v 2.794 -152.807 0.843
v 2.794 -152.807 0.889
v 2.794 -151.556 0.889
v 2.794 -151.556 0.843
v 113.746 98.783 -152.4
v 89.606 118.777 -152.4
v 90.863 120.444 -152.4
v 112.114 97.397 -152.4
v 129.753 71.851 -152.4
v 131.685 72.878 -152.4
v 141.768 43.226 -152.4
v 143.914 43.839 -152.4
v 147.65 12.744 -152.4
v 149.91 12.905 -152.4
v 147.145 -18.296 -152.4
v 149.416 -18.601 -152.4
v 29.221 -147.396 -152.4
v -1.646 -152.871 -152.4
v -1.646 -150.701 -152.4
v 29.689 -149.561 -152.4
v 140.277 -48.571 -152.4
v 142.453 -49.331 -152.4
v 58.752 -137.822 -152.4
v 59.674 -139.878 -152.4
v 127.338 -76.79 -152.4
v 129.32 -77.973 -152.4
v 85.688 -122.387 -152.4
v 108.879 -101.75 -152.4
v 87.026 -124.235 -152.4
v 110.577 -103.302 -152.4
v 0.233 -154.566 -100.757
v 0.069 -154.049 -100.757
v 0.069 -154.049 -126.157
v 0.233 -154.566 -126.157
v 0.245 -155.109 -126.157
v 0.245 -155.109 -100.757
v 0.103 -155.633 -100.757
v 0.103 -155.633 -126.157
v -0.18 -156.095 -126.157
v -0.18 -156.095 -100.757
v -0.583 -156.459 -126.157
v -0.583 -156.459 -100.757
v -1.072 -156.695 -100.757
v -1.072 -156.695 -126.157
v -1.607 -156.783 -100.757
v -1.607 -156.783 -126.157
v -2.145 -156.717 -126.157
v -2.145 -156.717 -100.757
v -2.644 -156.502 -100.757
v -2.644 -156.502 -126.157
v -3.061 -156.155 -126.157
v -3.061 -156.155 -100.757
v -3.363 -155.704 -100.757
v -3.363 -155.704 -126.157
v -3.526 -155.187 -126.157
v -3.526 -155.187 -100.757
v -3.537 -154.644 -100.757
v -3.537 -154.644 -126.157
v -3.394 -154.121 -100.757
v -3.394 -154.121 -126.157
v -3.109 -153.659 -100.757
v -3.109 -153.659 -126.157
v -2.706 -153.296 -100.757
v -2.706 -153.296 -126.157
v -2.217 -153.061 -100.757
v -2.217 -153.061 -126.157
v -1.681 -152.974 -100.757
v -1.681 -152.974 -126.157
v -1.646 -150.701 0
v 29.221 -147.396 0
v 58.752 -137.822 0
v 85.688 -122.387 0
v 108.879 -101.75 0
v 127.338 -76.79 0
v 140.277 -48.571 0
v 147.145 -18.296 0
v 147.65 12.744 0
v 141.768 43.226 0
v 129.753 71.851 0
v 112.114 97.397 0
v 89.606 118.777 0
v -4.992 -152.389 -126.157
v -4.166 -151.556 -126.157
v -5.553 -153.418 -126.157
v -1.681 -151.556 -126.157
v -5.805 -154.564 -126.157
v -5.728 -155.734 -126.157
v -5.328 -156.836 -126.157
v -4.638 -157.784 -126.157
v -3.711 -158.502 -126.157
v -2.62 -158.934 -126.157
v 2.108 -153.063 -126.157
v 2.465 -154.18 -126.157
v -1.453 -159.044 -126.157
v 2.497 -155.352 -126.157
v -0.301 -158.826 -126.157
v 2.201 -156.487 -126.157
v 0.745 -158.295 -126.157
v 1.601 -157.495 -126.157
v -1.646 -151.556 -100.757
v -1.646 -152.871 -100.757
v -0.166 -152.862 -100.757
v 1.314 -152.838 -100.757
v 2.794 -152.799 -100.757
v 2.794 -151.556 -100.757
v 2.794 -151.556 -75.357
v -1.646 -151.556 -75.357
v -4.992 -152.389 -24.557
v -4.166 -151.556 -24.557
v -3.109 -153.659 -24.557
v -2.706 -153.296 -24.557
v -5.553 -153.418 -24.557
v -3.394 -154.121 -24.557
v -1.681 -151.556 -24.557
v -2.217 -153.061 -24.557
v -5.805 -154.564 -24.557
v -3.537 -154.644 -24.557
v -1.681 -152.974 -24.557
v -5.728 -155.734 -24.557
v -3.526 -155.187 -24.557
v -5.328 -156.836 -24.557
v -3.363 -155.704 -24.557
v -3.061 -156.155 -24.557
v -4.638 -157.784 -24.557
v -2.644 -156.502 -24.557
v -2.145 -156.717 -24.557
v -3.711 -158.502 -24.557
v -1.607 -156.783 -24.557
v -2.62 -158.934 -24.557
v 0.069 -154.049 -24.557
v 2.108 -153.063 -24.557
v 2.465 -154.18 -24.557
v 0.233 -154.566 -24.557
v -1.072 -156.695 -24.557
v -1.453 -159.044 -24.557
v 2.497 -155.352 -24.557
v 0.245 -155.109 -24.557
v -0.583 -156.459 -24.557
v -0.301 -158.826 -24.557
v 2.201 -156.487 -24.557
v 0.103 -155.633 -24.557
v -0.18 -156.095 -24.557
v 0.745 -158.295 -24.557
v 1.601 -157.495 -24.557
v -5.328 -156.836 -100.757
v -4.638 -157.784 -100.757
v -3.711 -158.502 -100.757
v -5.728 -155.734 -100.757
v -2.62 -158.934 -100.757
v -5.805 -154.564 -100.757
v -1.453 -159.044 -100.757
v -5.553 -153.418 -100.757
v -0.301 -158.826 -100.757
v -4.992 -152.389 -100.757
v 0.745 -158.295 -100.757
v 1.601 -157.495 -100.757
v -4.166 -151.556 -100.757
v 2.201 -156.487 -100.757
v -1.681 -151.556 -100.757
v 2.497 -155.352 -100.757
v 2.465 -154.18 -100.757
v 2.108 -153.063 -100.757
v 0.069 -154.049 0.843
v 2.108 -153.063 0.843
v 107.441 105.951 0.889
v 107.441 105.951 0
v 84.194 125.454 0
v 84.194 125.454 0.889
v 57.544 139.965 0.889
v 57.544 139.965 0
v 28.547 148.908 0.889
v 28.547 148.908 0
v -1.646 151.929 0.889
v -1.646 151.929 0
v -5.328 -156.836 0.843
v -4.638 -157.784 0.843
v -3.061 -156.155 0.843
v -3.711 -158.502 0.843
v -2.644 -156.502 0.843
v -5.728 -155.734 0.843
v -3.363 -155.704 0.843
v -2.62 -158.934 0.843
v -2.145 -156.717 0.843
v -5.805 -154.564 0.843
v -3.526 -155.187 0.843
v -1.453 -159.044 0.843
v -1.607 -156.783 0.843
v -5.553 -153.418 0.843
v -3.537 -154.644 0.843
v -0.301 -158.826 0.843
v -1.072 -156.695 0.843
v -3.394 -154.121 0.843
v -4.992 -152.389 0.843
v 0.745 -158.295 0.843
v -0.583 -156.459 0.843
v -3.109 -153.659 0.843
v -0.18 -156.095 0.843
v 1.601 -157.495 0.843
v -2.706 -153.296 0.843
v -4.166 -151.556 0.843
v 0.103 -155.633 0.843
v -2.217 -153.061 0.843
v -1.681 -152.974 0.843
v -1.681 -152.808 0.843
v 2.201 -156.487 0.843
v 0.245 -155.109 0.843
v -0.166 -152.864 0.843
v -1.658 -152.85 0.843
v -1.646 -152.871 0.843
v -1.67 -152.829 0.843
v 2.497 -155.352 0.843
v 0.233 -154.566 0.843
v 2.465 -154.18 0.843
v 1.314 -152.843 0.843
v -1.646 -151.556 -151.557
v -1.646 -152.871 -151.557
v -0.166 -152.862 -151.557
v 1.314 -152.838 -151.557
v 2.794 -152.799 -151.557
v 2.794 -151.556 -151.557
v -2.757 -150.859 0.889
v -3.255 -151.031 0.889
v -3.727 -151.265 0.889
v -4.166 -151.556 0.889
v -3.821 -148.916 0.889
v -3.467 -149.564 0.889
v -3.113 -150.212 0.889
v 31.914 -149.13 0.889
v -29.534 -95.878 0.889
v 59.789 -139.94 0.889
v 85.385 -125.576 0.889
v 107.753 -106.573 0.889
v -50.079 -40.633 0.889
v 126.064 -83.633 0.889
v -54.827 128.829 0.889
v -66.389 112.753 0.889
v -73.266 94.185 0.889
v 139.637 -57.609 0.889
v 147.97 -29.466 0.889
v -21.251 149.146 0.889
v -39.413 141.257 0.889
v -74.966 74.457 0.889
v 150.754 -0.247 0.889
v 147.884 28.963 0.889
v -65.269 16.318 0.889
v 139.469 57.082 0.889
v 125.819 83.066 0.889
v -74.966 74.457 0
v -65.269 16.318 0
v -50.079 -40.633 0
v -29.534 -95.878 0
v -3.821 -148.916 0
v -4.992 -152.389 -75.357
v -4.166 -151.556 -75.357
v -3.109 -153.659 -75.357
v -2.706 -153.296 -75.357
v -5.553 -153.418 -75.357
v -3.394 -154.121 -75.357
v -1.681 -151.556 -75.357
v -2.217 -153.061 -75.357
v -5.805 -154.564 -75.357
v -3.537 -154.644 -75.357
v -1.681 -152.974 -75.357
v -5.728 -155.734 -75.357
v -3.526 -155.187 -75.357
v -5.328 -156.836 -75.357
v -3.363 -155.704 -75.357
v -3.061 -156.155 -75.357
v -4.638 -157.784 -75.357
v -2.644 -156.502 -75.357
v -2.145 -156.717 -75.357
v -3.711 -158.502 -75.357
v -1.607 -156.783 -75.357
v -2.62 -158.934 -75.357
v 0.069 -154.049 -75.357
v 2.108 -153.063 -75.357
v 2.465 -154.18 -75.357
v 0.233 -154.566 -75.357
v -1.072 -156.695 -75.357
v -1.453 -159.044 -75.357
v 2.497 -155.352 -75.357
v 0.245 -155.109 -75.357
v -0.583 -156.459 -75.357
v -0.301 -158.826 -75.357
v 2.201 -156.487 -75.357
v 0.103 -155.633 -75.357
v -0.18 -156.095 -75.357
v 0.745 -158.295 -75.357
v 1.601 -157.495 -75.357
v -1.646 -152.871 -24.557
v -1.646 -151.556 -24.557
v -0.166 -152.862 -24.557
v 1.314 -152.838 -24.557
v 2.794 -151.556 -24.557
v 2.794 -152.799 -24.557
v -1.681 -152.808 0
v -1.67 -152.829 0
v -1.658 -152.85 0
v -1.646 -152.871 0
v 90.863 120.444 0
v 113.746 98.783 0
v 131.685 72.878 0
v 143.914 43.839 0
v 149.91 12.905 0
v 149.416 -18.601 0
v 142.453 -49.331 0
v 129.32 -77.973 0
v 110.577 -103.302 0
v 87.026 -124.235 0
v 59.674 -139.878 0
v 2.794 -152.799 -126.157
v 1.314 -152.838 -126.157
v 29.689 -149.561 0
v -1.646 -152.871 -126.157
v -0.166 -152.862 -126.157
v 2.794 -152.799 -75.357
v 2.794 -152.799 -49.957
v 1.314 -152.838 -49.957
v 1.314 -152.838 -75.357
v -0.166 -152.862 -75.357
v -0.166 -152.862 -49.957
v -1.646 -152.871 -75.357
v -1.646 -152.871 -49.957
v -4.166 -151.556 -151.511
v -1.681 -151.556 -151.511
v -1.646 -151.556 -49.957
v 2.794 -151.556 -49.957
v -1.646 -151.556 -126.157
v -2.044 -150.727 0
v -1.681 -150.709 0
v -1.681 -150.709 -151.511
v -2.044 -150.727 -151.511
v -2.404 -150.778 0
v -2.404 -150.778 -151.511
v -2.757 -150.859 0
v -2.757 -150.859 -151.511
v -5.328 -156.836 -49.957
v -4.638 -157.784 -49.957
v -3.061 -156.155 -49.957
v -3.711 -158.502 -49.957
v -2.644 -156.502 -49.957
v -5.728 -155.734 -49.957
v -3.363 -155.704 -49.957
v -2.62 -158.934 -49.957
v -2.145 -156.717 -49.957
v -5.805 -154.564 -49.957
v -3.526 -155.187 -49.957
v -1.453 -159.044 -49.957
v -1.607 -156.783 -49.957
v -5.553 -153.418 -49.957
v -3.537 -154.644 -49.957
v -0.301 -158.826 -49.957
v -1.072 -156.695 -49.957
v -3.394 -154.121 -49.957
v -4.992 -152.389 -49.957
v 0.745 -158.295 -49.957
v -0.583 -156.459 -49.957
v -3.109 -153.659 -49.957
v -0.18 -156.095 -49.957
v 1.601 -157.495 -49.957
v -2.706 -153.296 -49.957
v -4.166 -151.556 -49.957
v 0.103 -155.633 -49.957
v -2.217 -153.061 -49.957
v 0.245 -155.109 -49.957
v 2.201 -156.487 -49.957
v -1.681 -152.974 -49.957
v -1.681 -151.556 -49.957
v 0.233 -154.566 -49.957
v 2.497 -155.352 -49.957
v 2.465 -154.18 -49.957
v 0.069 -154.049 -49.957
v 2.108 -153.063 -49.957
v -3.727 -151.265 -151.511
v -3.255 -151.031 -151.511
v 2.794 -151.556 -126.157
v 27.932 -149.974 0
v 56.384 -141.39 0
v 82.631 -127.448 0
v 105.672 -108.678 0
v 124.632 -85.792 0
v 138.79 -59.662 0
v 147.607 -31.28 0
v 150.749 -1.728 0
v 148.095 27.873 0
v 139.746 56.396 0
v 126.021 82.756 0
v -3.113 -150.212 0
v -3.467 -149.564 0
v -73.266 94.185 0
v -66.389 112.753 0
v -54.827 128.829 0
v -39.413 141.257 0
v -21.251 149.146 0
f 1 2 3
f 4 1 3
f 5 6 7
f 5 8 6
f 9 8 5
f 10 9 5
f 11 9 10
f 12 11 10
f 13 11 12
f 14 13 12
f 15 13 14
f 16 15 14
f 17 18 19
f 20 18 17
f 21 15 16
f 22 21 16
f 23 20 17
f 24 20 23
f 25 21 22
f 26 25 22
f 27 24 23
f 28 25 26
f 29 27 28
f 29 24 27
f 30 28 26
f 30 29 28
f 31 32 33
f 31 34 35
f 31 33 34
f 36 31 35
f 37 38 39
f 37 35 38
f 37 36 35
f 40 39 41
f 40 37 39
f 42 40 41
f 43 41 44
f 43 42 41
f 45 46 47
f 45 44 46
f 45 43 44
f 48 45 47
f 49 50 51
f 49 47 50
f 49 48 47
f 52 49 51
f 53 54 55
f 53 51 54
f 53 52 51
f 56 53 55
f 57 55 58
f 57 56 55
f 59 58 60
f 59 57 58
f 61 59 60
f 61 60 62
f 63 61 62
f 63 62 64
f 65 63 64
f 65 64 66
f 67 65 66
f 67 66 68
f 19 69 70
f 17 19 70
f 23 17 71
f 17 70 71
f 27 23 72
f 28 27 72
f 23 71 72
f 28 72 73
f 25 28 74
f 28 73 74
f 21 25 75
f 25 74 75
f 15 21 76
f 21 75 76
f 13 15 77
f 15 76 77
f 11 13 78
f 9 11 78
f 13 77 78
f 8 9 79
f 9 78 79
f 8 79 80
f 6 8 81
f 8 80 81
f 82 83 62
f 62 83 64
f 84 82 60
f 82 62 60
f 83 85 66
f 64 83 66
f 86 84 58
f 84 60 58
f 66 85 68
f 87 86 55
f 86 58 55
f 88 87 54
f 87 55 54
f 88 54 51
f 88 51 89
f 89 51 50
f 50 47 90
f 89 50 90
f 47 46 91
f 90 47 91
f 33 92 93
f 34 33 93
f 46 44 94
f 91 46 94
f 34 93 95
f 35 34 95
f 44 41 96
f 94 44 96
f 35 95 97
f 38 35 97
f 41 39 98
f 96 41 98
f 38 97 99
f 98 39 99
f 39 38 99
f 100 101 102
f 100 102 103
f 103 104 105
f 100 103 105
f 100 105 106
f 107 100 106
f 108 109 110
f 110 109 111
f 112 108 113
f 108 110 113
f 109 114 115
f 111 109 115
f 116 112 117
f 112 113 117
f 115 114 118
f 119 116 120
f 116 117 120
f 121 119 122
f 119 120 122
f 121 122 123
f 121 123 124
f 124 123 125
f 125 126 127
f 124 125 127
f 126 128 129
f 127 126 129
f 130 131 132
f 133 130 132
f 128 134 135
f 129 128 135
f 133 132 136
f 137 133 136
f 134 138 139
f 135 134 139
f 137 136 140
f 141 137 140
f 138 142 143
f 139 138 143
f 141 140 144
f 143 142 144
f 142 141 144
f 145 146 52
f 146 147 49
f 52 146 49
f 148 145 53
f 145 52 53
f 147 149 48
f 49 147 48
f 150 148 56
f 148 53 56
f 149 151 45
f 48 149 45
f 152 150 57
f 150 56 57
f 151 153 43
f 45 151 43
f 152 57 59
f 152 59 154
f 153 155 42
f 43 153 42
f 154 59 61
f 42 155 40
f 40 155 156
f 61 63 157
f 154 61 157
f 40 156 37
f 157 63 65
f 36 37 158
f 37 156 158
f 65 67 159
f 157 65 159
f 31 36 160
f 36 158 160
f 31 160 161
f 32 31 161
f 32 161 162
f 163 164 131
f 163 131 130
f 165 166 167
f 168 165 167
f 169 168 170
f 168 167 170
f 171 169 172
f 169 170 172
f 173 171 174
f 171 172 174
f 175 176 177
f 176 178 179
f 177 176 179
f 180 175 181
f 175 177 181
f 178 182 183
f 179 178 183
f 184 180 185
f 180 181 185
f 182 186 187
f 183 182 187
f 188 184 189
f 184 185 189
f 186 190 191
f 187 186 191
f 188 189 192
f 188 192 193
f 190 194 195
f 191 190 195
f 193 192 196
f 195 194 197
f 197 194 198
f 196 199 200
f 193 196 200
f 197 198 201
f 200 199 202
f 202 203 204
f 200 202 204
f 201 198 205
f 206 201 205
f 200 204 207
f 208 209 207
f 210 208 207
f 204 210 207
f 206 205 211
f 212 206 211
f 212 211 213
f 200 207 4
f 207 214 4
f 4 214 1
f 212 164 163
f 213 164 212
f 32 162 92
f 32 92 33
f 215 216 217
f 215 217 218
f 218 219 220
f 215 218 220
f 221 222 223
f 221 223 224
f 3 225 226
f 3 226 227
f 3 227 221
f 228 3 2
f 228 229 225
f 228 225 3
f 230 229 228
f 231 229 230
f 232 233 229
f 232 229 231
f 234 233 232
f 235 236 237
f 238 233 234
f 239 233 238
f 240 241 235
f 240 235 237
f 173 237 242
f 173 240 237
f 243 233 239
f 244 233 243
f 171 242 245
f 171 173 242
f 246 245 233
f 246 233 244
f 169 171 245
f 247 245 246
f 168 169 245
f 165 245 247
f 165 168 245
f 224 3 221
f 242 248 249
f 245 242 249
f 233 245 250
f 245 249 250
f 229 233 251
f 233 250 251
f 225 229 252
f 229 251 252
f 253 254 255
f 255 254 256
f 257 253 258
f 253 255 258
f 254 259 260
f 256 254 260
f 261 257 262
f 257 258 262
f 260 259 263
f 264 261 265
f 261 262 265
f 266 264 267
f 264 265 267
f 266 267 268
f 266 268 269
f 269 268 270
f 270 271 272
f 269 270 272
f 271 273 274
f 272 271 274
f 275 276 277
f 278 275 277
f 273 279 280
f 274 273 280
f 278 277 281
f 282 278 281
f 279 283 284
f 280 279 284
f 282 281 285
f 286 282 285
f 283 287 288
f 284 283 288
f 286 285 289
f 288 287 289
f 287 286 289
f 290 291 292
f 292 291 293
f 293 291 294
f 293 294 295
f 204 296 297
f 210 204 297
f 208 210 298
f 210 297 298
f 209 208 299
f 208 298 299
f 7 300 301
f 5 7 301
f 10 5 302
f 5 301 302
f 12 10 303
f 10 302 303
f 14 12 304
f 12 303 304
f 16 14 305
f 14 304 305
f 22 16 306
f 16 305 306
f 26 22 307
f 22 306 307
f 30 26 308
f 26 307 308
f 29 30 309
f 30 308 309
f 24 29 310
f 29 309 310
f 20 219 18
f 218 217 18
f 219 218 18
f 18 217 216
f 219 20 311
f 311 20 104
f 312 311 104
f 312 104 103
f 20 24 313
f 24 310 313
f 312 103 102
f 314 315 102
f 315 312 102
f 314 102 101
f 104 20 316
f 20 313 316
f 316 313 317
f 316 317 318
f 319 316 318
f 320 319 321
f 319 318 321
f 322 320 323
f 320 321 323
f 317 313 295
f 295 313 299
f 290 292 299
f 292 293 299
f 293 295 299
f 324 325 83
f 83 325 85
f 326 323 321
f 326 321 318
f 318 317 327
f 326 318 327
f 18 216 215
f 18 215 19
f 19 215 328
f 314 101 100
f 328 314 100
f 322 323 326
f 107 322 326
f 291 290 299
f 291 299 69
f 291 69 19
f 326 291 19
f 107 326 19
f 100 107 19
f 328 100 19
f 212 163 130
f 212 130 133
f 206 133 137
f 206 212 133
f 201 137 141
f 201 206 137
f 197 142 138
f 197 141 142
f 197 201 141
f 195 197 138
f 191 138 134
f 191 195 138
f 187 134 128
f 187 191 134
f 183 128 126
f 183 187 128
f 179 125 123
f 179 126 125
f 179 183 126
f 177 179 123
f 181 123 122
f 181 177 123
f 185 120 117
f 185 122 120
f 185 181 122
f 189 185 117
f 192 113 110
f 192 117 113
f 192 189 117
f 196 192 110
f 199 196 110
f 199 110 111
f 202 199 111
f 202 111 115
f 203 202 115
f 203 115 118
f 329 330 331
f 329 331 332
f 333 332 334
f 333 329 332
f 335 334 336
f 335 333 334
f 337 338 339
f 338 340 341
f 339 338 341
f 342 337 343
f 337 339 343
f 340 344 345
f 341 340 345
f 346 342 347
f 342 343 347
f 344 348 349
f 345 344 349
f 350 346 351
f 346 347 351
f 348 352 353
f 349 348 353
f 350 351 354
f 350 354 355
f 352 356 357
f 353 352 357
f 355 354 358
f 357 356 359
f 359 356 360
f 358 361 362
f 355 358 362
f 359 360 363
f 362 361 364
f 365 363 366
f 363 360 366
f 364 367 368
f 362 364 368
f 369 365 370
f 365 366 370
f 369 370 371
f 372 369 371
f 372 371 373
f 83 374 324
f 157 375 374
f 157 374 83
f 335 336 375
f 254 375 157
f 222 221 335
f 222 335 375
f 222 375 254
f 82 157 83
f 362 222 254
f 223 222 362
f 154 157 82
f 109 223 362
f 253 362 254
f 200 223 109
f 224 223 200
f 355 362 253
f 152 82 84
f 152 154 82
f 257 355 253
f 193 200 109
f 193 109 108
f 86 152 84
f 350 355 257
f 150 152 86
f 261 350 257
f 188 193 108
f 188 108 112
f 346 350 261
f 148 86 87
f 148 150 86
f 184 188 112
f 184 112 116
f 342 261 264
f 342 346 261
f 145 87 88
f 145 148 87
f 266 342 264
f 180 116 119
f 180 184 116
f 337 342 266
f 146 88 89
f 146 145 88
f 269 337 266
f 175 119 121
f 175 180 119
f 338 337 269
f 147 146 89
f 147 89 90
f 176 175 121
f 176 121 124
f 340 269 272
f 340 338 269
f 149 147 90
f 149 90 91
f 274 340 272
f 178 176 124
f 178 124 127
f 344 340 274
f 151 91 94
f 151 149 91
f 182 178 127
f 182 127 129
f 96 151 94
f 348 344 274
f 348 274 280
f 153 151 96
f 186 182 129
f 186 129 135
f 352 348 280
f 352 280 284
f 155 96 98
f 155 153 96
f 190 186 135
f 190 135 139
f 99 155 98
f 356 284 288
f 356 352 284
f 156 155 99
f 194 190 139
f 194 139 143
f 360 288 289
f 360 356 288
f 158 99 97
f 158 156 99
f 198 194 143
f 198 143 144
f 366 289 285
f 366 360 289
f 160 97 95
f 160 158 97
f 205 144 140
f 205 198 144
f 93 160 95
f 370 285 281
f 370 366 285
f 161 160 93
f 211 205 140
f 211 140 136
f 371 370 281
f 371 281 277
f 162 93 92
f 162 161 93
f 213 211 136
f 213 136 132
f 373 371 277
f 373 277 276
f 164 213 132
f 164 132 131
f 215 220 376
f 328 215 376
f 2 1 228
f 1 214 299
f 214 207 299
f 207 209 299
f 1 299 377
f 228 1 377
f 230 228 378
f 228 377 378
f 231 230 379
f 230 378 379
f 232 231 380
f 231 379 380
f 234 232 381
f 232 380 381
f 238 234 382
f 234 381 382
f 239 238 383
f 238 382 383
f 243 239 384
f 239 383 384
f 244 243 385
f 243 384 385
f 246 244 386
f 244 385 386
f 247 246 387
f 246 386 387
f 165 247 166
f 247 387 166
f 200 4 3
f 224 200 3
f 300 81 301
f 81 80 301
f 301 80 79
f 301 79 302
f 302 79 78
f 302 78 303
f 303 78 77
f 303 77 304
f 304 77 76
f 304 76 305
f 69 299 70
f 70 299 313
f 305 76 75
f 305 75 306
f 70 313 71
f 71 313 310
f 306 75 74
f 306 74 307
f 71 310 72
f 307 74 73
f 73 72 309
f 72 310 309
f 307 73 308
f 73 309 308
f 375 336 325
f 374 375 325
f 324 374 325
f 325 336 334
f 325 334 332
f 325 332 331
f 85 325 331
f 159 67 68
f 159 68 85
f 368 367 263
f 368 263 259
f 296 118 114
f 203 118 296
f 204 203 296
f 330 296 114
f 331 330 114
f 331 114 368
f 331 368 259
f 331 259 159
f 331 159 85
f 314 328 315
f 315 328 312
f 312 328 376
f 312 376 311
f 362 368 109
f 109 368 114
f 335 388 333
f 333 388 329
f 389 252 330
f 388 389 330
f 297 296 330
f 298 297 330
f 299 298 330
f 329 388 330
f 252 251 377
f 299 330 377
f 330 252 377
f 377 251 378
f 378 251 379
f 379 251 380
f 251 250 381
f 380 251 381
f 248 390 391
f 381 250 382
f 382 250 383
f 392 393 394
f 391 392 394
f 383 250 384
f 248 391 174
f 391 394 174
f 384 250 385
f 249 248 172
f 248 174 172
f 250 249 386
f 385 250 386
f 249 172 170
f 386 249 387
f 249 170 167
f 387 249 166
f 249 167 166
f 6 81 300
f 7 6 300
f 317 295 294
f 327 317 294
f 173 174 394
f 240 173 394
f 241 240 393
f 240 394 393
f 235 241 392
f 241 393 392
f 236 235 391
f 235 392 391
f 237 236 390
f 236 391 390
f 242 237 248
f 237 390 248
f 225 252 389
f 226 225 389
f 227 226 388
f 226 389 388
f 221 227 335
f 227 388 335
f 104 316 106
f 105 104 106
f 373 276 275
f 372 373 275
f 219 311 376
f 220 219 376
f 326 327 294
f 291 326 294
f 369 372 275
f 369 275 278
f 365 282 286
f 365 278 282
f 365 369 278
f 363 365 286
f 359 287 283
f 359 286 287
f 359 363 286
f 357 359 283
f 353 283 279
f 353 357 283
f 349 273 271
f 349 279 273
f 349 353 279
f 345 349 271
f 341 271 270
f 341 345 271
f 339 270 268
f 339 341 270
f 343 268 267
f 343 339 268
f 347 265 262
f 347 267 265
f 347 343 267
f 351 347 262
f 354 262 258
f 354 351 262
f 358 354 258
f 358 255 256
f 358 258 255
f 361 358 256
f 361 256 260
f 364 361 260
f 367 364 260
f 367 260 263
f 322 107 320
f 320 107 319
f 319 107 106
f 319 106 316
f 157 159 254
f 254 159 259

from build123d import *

# Parameters (mm, degrees)
F1_DEPTH      = 0.889
F3_DEPTH      = 152.4
F5_DEPTH      = 152.4
F7_DEPTH      = 2.794
F7_DEPTH_BACK = 25.4


with BuildPart() as f1:
    # F0 (on Top) → F1 (new body)
    with BuildSketch(Plane.XY):
        with BuildLine():
            Line((104.8647104191, 103.4104977604), (107.4410535939, 105.9511134646))
            ThreePointArc((107.4410535939, 105.9511134646), (57.5440925804, 139.9647071727), (-1.646224697, 151.9287205432))
            ThreePointArc((-1.646224697, 151.9287205432), (-54.8274165052, 128.8286295835), (-74.9656821683, 74.4567285632))
            ThreePointArc((-74.9656821683, 74.4567285632), (-50.0786323185, -40.6329360959), (-3.82113499, -148.9160839189))
            ThreePointArc((-3.82113499, -148.9160839189), (134.5057048325, -58.9275907244), (104.8647104191, 103.4104977604))
        make_face()
        with BuildLine():
            ThreePointArc((-3.82113499, -148.9160839189), (-2.7372897039, -150.8956667029), (-1.646224697, -152.8712794568))
            ThreePointArc((-1.646224697, -152.8712794568), (138.7897619326, -59.6615967341), (107.4410535939, 105.9511134646))
            Line((107.4410535939, 105.9511134646), (104.8647104191, 103.4104977604))
            ThreePointArc((104.8647104191, 103.4104977604), (134.5057048325, -58.9275907244), (-3.82113499, -148.9160839189))
        make_face()
    extrude(amount=F1_DEPTH)

    # F4 (on face) → F5 (join)
    with BuildSketch(Plane.XY.offset(0.889)):
        with BuildLine():
            ThreePointArc((0.0687806999, -154.0492904087), (-2.6435357958, -156.5016984542), (-1.681308085, -152.9739394166))
            Line((-1.681308085, -152.9739394166), (-1.681308085, -152.8080176611))
            ThreePointArc((-1.681308085, -152.8080176611), (-2.2202251071, -151.834050614), (-2.7573875275, -150.8591147702))
            ThreePointArc((-2.7573875275, -150.8591147702), (-3.3669851054, -158.6773081165), (2.108116449, -153.0631279113))
            Line((2.108116449, -153.0631279113), (0.0687806999, -154.0492904087))
        make_face()
        with BuildLine():
            ThreePointArc((-2.7573875275, -150.8591147702), (-2.2202251071, -151.834050614), (-1.681308085, -152.8080176611))
            Line((-1.681308085, -152.8080176611), (-1.681308085, -150.7085030485))
            ThreePointArc((-1.681308085, -150.7085030485), (-2.2242740643, -150.7486121468), (-2.7573875275, -150.8591147702))
        make_face()
    extrude(amount=-F5_DEPTH)


with BuildPart() as f3:
    # F2 (on face) → F3 (new body)
    with BuildSketch(Plane(origin=(0, 0, 0), x_dir=(1, 0, 0), z_dir=(0, 0, -1))):
        with BuildLine():
            Line((89.605505981, -118.7772235698), (90.8628587214, -120.4439165471))
            ThreePointArc((90.8628587214, -120.4439165471), (142.4534143114, 49.3313434088), (-1.646224697, 152.8712794568))
            Line((-1.646224697, 152.8712794568), (-1.646224697, 150.7014483213))
            ThreePointArc((-1.646224697, 150.7014483213), (140.2771274439, 48.5706756767), (89.605505981, -118.7772235698))
        make_face()
    extrude(amount=F3_DEPTH)


with BuildPart() as f7_tool:
    # F6 (on Right) → F7 (new body, two sides)
    with BuildSketch(Plane.YZ) as f7_sk:
        Polygon((-160.2078721456, 0.8427356878), (-151.5557976027, 0.8427356878), (-151.5557976027, 9.4913730934), (-177.3275714077, 9.4913730934), (-177.3275714077, -151.5572643122), (-151.5557976027, -151.5572643122), (-151.5557976027, -126.1572643122), (-160.2078721456, -126.1572643122), (-160.2078721456, -100.7572643122), (-151.5557976027, -100.7572643122), (-151.5557976027, -75.3572643122), (-160.2078721456, -75.3572643122), (-160.2078721456, -49.9572643122), (-151.5557976027, -49.9572643122), (-151.5557976027, -24.5572643122), (-160.2078721456, -24.5572643122), align=None)
    extrude(amount=F7_DEPTH)
    extrude(f7_sk.sketch, amount=-F7_DEPTH_BACK)


with BuildPart() as f1_1:
    add(f1.part)

    # F7: cut by f7_tool
    add(f7_tool.part, mode=Mode.SUBTRACT)


with BuildPart() as f3_1:
    add(f3.part)

    # F7: cut by f7_tool
    add(f7_tool.part, mode=Mode.SUBTRACT)


solid = Compound([f1_1.part, f3_1.part])
